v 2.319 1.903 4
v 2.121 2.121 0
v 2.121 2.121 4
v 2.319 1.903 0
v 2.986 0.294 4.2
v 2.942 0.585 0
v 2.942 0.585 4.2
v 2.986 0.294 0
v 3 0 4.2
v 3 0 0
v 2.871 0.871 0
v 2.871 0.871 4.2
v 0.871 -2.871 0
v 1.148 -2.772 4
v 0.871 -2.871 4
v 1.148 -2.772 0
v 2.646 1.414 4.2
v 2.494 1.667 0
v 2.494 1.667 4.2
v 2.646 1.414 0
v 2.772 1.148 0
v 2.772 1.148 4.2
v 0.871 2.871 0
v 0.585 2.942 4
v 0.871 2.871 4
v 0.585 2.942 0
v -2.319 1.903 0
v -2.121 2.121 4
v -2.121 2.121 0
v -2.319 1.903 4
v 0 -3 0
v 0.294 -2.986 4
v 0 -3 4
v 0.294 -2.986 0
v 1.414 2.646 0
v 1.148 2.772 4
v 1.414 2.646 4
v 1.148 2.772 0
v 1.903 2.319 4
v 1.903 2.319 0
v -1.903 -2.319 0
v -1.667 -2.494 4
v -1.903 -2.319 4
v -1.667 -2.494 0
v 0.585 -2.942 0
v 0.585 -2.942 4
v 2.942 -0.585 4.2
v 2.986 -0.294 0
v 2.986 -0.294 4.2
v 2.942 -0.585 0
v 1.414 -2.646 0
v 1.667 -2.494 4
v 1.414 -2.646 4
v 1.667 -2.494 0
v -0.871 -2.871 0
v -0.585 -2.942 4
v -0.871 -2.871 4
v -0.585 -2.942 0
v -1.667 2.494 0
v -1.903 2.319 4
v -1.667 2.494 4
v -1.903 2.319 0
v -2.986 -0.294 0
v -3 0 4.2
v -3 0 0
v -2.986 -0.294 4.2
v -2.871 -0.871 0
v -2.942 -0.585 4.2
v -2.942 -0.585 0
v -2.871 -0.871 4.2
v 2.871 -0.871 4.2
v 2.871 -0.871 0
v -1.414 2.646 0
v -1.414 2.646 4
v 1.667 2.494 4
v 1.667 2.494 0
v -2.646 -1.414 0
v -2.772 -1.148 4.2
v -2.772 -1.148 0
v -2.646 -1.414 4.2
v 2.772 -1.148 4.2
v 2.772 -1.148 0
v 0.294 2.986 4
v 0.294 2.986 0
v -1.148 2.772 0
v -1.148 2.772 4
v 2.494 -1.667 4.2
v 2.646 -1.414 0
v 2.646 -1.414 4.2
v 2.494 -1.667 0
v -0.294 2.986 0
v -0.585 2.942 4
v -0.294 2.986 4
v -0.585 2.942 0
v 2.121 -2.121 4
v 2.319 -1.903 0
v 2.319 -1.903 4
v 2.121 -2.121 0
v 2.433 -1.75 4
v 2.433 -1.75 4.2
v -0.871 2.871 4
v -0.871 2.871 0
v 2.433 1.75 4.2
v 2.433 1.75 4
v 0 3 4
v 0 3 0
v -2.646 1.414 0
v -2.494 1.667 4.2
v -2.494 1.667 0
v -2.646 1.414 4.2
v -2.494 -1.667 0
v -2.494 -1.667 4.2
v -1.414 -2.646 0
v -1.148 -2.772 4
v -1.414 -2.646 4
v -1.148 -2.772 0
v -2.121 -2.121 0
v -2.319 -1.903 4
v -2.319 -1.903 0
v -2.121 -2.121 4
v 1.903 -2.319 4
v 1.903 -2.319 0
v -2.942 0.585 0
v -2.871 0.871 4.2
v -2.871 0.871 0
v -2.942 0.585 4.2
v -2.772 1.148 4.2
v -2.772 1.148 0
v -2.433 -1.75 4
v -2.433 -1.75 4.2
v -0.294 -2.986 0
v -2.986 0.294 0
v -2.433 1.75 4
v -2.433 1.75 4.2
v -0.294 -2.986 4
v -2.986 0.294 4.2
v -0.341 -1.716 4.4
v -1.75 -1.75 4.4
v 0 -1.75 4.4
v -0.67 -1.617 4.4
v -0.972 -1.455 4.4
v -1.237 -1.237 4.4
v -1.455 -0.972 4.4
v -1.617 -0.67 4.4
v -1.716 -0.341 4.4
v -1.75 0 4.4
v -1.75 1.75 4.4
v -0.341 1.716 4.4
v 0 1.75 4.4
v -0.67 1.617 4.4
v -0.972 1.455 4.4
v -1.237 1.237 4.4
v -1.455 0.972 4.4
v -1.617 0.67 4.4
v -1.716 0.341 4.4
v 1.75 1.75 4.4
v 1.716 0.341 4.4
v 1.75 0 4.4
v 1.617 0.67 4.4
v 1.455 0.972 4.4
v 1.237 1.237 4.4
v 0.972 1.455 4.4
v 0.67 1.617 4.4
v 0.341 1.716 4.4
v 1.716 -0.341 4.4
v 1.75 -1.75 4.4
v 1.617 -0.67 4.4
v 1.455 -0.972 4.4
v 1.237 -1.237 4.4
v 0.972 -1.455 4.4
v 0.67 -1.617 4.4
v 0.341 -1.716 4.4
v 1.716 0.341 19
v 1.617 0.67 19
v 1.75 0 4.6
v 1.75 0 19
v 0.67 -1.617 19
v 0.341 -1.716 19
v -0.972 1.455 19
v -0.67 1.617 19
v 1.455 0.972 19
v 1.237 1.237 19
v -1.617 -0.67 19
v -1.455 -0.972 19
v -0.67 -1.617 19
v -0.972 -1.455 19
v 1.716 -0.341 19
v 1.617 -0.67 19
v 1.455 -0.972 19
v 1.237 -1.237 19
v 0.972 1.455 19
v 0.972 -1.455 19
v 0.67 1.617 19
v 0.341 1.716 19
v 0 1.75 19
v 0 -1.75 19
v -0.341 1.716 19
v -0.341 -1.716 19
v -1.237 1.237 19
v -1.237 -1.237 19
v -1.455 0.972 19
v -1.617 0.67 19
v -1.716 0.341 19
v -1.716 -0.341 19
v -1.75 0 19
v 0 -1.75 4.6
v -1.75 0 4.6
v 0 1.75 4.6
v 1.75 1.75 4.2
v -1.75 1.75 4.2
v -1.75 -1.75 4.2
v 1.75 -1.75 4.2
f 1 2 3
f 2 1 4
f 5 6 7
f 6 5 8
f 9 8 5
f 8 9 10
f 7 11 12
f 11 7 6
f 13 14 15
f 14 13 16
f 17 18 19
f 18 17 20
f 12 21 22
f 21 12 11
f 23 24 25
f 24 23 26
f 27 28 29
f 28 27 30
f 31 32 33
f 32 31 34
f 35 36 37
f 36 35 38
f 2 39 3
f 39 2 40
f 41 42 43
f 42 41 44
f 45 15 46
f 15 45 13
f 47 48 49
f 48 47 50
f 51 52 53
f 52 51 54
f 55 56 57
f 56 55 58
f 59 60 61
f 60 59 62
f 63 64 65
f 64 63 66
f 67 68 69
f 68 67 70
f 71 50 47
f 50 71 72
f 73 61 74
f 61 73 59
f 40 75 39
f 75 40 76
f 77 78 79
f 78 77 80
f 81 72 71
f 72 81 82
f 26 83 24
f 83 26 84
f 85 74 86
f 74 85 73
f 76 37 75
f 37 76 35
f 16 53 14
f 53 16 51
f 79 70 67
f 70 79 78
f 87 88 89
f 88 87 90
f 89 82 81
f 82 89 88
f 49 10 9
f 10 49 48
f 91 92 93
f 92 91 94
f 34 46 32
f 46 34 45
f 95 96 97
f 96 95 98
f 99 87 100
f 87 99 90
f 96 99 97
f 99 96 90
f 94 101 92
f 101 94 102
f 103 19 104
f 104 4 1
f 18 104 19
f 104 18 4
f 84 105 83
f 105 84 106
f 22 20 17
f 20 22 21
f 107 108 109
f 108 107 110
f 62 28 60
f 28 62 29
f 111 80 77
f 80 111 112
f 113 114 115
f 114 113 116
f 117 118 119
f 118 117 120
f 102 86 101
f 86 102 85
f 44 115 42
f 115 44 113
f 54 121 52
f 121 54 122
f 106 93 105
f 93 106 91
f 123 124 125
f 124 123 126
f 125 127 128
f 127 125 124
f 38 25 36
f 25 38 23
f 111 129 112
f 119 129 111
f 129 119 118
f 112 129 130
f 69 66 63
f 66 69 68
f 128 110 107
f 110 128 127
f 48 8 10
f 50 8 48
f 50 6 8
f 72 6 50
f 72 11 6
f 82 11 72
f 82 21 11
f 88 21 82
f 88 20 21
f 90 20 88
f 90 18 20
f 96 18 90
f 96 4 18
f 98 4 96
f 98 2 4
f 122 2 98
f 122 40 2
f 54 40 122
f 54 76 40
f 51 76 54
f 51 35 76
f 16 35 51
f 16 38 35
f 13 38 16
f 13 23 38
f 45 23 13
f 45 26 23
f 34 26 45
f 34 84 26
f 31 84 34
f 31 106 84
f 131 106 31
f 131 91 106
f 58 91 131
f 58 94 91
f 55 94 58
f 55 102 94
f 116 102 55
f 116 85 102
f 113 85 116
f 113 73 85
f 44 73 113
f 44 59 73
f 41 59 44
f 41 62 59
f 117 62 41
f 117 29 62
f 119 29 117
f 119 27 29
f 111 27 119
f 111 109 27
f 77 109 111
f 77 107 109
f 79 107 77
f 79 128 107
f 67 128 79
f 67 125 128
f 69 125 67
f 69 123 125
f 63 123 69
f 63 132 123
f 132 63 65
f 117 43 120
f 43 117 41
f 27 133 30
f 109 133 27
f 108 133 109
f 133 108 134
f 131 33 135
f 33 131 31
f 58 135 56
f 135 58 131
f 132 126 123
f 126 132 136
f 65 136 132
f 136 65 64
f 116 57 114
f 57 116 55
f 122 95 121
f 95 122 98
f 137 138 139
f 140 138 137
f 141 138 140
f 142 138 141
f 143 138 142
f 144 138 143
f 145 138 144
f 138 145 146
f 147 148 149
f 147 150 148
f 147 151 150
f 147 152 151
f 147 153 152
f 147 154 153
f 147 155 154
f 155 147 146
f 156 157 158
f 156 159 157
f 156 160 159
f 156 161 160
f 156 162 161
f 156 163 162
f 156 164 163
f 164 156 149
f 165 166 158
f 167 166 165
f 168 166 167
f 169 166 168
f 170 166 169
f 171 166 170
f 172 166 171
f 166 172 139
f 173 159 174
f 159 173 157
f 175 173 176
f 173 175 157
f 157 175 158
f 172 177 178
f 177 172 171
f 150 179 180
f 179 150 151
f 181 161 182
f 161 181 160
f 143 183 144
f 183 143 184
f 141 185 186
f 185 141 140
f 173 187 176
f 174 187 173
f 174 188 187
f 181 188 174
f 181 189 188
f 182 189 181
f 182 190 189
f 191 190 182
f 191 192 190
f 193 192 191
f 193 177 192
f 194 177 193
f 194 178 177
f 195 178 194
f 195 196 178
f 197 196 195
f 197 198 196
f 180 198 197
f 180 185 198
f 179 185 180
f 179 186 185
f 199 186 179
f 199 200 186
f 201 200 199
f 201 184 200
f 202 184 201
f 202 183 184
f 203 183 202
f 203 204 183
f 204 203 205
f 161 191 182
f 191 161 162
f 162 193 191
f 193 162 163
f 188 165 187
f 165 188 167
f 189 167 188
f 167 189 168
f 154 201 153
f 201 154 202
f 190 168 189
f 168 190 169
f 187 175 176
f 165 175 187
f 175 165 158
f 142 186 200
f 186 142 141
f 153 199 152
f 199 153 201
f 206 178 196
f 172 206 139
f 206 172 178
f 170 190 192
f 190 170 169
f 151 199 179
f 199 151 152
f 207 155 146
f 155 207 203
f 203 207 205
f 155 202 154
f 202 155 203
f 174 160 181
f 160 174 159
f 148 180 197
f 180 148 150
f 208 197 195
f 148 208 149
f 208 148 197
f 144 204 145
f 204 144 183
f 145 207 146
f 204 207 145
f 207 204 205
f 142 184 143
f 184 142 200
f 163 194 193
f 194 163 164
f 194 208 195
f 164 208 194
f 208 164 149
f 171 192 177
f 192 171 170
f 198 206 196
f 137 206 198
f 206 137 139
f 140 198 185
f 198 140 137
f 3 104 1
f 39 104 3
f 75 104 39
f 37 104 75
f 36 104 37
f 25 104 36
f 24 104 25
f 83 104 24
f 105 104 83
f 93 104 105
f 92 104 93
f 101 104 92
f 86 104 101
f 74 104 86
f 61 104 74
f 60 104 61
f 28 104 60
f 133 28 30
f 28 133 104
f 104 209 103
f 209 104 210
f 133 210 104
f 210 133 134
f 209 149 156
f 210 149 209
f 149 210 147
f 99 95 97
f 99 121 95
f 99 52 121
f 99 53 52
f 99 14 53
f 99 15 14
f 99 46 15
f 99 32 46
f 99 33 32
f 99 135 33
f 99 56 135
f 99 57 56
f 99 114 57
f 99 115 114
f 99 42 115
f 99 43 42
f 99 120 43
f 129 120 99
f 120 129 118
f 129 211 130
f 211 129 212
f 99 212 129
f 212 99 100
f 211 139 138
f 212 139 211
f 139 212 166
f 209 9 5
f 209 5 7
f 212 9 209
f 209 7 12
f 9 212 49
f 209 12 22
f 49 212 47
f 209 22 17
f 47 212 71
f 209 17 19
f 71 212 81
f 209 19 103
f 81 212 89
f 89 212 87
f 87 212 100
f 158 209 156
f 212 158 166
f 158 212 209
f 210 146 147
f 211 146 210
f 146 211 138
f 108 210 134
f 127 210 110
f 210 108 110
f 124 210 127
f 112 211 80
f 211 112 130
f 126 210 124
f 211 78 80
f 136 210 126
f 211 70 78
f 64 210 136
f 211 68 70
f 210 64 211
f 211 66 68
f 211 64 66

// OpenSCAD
ST = 4; // Senkungstiefe 
SD = 6; // Senkungsdurchmesser 
DL = 15; // Durchgangslochlaenge 
DD = 3.5; // Durchgangslochdurchmesser 
LH = 0.2; // Layerhoehe 

difference(){ // Vom ersten Koerper alle folgenden abziehen:
    
    union(){ // Die Grundform des Durchgangslochs mit Senkung
    cylinder(ST+2*LH, d=SD, $fn=64); // Senkung plus zwei Layerhoehen
    translate ([0,0,ST]) cylinder(DL, d=DD, $fn=32); // Durchgangsloch, um Senktiefe in Z-Richtung verschoben 
    };
    
    translate ([-SD/2,DD/2,ST]) cube([SD, (SD-DD)/2, 2*LH+LH]); // um eine Layerhoehe nach oben dicker, damit die Subtraktion gut funktioniert, ohne an der Grenzflaeche Artefakte hervorzurufen
    mirror ([0,1,0]) translate ([-SD/2,DD/2,ST]) cube([SD, (SD-DD)/2, 2*LH+LH]); // dasselbe, nur gespiegelt in Bezug auf die Y-Koordinate 
        
    translate ([DD/2,-SD/2,ST+LH]) cube([(SD-DD)/2, SD, 2*LH]); // um eine Layerhoehe nach oben dicker, damit die Subtraktion gut funktioniert, ohne an der Grenzflaeche Artefakte hervorzurufen
    mirror ([1,0,0]) translate ([DD/2,-SD/2,ST+LH]) cube([(SD-DD)/2, SD, 2*LH]); // dasselbe, nur gespiegelt in Bezug auf die X-Koordinate
};
